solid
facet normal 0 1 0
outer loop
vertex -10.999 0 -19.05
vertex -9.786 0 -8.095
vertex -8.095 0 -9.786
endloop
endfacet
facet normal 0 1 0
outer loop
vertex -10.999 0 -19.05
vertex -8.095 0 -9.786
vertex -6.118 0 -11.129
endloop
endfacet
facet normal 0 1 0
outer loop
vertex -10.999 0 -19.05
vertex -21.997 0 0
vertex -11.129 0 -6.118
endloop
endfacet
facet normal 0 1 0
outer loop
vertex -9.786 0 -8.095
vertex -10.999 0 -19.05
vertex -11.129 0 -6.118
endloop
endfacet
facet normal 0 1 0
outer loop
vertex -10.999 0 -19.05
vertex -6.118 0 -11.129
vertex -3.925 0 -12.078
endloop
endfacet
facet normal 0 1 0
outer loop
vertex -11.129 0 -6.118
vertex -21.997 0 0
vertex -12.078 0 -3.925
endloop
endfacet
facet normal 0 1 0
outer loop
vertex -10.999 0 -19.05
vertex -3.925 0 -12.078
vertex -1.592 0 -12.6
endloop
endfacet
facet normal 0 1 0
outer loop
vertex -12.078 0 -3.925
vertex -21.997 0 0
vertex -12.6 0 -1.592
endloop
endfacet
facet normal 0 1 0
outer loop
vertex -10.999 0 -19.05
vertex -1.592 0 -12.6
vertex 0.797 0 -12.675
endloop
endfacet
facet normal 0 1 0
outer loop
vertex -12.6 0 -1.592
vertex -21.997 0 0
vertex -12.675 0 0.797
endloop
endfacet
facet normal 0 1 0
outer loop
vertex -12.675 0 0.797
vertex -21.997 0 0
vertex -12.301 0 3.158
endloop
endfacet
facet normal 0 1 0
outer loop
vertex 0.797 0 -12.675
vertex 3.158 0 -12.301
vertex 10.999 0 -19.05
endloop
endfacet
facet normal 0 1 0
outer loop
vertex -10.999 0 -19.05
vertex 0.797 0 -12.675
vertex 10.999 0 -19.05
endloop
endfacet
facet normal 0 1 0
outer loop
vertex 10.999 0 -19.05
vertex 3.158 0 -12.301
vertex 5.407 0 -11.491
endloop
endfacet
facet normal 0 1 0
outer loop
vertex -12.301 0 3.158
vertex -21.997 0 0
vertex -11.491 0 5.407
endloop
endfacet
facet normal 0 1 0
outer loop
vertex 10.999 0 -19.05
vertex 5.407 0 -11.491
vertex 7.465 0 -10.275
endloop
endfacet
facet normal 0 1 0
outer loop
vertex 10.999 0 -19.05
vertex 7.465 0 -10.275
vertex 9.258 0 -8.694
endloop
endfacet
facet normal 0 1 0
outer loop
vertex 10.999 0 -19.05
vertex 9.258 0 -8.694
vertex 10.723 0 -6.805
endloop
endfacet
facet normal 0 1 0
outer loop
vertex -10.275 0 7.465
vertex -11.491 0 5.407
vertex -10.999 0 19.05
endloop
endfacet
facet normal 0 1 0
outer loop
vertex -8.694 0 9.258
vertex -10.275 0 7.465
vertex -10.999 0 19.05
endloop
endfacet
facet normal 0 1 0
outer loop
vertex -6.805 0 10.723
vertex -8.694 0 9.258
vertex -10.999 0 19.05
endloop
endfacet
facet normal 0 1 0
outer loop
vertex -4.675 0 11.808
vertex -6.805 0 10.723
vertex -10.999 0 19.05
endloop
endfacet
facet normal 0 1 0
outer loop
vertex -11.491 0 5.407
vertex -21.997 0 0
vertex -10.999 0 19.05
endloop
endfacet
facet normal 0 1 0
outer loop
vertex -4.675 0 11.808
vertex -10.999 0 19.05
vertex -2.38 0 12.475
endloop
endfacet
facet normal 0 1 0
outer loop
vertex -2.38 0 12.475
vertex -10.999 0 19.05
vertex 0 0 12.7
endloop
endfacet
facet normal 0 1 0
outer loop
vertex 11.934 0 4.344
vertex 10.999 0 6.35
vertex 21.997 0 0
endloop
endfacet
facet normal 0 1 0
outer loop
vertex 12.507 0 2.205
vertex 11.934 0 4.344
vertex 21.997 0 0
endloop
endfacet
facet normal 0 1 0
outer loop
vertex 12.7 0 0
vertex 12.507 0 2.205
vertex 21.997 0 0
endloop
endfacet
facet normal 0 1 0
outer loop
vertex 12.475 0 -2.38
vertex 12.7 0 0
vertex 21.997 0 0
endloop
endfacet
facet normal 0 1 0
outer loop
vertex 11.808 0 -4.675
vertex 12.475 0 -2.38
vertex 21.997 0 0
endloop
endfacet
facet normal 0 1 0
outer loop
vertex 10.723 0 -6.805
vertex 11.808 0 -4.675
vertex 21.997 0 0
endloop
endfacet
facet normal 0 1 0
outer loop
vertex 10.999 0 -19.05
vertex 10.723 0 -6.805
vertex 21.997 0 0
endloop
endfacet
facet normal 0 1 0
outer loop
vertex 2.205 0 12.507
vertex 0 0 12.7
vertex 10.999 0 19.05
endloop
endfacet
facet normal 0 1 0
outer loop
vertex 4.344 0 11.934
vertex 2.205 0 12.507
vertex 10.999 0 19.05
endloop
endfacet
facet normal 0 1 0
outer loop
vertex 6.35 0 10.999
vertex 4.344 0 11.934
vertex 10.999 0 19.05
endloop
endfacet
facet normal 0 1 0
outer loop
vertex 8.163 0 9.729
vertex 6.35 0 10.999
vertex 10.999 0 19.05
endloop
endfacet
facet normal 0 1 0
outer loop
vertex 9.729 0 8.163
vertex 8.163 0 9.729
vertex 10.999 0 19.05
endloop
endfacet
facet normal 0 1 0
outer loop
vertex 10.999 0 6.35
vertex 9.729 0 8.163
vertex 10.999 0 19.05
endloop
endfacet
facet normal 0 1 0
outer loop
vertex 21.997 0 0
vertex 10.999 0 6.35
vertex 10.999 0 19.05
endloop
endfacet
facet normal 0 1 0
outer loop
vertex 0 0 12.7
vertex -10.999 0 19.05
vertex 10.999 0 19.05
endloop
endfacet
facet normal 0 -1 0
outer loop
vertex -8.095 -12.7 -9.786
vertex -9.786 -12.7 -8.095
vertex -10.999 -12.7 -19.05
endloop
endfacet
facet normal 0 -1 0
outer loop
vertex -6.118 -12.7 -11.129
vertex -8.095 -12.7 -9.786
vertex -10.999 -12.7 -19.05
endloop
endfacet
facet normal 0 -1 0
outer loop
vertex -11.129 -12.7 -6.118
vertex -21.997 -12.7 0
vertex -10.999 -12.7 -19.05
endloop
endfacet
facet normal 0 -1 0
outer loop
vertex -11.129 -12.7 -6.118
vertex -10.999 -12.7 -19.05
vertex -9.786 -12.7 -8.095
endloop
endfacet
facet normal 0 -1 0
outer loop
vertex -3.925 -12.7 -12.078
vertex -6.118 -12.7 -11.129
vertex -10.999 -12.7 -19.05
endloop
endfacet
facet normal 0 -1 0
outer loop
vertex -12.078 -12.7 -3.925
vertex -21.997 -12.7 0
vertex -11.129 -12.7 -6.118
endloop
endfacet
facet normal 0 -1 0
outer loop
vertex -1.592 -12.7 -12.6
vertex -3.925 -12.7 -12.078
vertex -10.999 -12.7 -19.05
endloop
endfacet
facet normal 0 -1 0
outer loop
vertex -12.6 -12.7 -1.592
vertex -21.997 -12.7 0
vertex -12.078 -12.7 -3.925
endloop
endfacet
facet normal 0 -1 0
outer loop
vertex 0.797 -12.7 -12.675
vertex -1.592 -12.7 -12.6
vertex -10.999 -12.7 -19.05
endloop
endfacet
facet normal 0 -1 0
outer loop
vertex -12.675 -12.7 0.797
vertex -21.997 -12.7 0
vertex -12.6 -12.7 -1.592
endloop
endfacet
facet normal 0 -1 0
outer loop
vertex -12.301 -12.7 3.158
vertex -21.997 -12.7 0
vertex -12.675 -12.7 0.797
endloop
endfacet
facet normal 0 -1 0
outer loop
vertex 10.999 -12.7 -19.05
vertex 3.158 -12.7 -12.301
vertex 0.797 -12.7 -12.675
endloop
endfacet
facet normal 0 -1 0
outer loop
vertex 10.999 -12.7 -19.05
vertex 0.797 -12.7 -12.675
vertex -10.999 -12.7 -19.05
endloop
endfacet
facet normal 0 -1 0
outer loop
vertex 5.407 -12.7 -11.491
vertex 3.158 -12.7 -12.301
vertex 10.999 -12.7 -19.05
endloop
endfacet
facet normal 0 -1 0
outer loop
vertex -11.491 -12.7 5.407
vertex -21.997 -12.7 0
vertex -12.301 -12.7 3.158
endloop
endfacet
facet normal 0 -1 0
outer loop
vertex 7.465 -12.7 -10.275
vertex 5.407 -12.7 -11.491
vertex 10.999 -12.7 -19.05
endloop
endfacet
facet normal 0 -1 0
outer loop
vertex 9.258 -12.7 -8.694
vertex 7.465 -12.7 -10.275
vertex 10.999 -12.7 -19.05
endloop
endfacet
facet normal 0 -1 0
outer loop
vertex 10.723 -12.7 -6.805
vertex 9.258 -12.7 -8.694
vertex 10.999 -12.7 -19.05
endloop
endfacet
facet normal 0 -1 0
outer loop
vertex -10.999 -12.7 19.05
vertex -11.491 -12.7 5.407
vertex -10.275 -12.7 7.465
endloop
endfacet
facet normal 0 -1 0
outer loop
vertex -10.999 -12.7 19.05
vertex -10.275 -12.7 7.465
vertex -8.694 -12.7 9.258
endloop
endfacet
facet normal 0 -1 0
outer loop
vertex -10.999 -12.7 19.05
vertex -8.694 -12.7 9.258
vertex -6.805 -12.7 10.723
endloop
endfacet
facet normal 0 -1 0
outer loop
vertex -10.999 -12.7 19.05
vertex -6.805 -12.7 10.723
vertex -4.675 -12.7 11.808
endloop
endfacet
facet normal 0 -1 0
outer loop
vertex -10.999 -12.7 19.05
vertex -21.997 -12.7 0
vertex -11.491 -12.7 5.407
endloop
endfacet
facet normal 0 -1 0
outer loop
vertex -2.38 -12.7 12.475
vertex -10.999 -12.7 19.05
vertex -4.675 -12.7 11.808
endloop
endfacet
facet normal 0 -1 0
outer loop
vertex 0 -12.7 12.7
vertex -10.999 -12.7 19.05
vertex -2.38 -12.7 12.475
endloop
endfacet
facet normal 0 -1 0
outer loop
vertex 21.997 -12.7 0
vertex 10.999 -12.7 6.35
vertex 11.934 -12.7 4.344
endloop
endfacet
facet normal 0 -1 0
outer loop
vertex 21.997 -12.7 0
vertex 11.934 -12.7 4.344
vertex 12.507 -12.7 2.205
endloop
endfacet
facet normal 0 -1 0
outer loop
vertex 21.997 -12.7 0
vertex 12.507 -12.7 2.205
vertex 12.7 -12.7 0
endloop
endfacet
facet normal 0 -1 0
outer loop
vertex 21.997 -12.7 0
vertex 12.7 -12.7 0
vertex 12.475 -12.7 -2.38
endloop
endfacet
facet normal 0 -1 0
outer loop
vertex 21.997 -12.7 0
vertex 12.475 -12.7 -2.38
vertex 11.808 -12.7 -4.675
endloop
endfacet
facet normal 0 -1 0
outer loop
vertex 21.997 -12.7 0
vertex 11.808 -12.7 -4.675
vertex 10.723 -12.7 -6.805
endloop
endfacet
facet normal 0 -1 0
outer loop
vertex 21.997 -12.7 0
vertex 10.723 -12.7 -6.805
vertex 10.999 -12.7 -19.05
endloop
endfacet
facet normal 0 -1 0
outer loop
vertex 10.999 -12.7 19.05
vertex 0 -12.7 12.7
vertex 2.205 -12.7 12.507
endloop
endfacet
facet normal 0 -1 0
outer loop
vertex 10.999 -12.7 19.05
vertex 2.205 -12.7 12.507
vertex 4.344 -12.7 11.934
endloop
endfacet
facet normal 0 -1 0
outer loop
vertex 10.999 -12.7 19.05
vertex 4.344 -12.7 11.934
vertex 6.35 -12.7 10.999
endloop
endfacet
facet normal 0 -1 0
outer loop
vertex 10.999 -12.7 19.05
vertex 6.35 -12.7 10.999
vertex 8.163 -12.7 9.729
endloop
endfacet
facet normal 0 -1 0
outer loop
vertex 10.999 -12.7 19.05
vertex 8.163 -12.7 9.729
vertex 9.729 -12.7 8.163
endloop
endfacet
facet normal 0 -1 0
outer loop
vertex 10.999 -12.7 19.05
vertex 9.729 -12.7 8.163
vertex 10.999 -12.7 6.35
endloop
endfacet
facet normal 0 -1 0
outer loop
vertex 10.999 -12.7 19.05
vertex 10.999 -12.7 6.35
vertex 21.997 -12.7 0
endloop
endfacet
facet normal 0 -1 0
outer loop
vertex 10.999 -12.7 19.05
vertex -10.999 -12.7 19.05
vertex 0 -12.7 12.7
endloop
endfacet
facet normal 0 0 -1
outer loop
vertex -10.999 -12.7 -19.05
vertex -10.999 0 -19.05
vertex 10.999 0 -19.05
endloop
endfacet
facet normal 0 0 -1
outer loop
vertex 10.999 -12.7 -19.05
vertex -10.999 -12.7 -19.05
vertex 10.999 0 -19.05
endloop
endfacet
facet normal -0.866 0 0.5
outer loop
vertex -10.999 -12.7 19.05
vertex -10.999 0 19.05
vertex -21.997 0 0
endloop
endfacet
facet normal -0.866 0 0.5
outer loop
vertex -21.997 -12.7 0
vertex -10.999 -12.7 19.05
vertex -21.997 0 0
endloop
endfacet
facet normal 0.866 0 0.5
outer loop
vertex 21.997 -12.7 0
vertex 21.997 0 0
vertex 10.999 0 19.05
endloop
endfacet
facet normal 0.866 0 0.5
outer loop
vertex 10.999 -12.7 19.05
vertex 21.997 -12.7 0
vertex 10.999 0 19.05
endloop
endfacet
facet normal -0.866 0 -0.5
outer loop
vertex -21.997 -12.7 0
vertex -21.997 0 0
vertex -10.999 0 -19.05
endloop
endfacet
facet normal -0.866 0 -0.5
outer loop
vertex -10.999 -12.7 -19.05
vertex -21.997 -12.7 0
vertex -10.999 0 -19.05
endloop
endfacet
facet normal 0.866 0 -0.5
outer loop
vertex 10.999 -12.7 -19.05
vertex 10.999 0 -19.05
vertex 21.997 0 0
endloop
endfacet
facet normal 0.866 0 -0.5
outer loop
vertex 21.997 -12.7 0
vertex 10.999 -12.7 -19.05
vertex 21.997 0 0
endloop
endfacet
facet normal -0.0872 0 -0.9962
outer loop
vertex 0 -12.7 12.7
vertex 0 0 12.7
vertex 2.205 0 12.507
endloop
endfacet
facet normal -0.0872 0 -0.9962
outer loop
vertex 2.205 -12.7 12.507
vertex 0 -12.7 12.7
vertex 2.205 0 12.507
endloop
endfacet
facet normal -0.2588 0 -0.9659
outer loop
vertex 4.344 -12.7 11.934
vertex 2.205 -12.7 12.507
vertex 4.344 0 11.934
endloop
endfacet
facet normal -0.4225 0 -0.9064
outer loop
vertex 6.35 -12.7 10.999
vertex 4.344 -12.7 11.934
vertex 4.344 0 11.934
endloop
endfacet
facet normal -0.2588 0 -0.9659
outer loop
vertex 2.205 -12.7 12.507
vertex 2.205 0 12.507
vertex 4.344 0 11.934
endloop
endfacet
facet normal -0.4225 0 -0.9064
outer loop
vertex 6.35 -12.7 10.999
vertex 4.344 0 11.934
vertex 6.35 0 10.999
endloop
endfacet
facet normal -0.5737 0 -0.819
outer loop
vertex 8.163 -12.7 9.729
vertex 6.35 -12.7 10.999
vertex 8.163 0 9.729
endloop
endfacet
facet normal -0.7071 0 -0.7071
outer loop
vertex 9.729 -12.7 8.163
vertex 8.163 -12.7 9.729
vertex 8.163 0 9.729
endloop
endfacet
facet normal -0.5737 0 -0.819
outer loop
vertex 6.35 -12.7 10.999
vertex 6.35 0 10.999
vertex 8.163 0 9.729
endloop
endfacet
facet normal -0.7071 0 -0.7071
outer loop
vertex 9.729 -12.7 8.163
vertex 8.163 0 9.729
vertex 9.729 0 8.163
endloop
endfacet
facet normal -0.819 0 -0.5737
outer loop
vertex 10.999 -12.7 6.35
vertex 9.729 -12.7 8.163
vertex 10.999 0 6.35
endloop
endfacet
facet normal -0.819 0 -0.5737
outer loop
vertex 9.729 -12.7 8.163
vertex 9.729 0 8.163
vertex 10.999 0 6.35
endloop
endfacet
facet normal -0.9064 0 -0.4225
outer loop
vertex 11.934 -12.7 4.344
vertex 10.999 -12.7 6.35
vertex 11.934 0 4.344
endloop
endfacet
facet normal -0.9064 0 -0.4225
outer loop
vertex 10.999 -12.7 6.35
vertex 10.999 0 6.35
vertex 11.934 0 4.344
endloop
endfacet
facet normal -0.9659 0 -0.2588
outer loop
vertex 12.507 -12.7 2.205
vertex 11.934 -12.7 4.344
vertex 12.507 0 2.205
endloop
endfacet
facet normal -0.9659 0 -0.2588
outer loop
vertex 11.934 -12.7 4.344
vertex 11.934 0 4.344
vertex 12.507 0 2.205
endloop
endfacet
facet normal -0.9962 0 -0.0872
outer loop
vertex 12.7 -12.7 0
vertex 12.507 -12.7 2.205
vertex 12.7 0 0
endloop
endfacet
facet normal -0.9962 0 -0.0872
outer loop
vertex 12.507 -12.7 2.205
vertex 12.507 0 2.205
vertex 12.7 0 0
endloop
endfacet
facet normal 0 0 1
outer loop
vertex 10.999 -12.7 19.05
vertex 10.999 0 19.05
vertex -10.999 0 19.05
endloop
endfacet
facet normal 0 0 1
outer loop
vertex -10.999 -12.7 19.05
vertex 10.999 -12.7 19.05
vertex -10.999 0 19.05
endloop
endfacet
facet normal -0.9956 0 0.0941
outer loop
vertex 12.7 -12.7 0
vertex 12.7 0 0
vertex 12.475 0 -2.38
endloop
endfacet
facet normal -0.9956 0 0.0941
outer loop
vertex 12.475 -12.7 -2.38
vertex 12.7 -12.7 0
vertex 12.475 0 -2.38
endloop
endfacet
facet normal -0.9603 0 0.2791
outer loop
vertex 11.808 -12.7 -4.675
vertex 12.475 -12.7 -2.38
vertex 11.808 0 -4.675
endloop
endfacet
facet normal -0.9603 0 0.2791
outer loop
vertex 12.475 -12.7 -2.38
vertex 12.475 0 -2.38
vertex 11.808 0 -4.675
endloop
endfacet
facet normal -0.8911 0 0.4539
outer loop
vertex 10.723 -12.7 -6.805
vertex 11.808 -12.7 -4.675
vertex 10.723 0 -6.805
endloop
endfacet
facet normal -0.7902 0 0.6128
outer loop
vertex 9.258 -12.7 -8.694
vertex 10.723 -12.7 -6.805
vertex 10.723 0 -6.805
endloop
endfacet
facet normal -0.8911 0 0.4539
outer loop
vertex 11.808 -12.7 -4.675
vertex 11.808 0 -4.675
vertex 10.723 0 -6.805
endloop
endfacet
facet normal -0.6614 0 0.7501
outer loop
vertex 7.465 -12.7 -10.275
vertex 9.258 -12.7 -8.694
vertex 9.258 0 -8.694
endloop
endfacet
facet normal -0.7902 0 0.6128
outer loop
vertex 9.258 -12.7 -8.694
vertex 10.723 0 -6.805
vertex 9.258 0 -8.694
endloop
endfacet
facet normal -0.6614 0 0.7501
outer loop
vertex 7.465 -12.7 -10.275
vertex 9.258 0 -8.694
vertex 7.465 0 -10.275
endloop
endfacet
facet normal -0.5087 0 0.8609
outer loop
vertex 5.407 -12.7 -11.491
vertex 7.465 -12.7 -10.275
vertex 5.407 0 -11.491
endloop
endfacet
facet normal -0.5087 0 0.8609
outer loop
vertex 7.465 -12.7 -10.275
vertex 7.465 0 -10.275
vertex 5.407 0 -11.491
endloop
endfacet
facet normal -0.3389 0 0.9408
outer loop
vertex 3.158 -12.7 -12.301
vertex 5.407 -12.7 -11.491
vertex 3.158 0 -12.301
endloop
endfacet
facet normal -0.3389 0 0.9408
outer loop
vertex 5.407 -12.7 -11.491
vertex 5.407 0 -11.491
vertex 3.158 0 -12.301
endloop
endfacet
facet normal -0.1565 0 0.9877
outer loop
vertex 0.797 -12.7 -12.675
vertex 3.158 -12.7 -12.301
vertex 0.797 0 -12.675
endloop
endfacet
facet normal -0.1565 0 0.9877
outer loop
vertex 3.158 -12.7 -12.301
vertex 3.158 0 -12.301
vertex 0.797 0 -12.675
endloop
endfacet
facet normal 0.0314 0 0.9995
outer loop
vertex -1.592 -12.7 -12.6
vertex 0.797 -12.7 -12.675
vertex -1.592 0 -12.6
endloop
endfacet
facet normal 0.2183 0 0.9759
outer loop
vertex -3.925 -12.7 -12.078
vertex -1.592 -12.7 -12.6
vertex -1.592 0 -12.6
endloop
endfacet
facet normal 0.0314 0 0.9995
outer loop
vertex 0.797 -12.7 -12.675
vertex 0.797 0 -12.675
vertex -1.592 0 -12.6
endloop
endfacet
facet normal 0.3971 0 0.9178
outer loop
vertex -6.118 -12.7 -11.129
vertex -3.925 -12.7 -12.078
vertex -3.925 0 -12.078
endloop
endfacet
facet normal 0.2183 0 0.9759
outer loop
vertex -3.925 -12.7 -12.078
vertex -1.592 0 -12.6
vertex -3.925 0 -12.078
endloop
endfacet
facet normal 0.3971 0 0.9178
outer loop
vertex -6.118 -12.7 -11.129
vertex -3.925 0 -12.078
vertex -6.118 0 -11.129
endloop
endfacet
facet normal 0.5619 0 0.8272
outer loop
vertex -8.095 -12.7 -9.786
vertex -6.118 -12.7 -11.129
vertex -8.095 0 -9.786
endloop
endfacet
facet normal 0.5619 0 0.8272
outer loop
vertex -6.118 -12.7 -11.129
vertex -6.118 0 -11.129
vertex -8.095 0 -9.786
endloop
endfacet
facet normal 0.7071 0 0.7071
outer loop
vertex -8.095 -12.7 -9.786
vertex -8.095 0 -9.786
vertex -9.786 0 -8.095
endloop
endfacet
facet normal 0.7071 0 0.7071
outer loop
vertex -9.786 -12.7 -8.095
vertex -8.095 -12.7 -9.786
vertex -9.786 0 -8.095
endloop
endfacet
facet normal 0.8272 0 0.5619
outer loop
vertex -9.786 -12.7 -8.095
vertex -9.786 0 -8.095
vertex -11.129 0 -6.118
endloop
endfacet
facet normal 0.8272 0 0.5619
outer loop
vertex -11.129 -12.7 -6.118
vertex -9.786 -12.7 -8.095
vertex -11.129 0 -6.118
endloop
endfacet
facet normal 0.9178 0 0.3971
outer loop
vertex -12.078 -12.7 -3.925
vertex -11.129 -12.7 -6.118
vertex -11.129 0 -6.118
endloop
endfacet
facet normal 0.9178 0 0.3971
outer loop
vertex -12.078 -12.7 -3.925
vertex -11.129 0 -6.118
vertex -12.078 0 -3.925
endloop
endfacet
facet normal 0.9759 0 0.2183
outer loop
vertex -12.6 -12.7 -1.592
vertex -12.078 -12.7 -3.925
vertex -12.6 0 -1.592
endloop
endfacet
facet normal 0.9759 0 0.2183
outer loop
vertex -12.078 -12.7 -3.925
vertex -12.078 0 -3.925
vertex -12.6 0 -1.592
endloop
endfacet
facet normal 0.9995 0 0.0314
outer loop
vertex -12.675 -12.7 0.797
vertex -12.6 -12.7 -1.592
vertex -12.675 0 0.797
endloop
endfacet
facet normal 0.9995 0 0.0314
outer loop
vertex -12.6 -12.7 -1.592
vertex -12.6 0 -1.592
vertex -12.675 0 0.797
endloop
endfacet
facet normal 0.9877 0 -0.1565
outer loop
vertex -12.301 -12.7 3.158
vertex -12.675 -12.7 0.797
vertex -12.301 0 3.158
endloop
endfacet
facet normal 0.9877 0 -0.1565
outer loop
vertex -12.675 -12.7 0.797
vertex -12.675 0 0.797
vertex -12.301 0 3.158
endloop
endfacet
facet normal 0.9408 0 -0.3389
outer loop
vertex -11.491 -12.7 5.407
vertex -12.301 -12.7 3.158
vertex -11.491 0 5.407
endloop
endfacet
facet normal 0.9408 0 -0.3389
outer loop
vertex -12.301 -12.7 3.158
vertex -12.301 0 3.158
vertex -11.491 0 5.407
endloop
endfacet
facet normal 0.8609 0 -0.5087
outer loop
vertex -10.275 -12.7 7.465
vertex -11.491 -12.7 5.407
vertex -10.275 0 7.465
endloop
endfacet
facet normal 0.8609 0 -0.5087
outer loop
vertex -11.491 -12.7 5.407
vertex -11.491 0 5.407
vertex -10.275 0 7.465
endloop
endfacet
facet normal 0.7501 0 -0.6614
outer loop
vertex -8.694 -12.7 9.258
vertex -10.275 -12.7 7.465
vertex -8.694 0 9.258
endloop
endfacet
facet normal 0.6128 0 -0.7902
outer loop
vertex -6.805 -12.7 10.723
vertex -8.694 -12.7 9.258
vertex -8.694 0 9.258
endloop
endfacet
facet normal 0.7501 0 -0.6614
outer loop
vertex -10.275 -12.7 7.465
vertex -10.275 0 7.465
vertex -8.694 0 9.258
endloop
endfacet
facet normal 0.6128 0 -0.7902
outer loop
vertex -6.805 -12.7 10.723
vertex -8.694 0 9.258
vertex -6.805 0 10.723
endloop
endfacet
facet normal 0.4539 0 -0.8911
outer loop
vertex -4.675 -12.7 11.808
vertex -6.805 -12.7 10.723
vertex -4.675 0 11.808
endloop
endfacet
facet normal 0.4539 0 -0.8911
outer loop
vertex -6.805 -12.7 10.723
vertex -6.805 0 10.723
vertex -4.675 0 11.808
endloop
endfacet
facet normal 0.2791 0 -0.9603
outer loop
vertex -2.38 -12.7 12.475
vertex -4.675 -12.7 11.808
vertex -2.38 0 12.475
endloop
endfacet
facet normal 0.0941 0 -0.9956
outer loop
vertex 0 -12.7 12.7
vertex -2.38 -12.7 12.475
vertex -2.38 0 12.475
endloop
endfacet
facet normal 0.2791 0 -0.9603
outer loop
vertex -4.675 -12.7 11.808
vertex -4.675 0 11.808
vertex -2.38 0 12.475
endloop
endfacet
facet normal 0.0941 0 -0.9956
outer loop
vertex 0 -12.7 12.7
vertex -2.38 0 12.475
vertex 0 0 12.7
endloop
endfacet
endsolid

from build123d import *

# Parameters (mm, degrees)
F1_DEPTH = 12.7


with BuildPart() as f1:
    # F0 (on Front) → F1 (new body)
    with BuildSketch(Plane.XZ):
        Polygon((10.998523, 19.05), (0, 19.05), (-10.998523, 19.05), (-21.997045, 0), (-10.998523, -19.05), (10.998523, -19.05), (21.997045, 0), align=None)
        with BuildLine():
            ThreePointArc((12.7, 0), (-8.980256, -8.980256), (0, 12.7))
            ThreePointArc((0, 12.7), (8.980256, 8.980256), (12.7, 0))
        make_face(mode=Mode.SUBTRACT)
    extrude(amount=F1_DEPTH)


solid = f1.part
